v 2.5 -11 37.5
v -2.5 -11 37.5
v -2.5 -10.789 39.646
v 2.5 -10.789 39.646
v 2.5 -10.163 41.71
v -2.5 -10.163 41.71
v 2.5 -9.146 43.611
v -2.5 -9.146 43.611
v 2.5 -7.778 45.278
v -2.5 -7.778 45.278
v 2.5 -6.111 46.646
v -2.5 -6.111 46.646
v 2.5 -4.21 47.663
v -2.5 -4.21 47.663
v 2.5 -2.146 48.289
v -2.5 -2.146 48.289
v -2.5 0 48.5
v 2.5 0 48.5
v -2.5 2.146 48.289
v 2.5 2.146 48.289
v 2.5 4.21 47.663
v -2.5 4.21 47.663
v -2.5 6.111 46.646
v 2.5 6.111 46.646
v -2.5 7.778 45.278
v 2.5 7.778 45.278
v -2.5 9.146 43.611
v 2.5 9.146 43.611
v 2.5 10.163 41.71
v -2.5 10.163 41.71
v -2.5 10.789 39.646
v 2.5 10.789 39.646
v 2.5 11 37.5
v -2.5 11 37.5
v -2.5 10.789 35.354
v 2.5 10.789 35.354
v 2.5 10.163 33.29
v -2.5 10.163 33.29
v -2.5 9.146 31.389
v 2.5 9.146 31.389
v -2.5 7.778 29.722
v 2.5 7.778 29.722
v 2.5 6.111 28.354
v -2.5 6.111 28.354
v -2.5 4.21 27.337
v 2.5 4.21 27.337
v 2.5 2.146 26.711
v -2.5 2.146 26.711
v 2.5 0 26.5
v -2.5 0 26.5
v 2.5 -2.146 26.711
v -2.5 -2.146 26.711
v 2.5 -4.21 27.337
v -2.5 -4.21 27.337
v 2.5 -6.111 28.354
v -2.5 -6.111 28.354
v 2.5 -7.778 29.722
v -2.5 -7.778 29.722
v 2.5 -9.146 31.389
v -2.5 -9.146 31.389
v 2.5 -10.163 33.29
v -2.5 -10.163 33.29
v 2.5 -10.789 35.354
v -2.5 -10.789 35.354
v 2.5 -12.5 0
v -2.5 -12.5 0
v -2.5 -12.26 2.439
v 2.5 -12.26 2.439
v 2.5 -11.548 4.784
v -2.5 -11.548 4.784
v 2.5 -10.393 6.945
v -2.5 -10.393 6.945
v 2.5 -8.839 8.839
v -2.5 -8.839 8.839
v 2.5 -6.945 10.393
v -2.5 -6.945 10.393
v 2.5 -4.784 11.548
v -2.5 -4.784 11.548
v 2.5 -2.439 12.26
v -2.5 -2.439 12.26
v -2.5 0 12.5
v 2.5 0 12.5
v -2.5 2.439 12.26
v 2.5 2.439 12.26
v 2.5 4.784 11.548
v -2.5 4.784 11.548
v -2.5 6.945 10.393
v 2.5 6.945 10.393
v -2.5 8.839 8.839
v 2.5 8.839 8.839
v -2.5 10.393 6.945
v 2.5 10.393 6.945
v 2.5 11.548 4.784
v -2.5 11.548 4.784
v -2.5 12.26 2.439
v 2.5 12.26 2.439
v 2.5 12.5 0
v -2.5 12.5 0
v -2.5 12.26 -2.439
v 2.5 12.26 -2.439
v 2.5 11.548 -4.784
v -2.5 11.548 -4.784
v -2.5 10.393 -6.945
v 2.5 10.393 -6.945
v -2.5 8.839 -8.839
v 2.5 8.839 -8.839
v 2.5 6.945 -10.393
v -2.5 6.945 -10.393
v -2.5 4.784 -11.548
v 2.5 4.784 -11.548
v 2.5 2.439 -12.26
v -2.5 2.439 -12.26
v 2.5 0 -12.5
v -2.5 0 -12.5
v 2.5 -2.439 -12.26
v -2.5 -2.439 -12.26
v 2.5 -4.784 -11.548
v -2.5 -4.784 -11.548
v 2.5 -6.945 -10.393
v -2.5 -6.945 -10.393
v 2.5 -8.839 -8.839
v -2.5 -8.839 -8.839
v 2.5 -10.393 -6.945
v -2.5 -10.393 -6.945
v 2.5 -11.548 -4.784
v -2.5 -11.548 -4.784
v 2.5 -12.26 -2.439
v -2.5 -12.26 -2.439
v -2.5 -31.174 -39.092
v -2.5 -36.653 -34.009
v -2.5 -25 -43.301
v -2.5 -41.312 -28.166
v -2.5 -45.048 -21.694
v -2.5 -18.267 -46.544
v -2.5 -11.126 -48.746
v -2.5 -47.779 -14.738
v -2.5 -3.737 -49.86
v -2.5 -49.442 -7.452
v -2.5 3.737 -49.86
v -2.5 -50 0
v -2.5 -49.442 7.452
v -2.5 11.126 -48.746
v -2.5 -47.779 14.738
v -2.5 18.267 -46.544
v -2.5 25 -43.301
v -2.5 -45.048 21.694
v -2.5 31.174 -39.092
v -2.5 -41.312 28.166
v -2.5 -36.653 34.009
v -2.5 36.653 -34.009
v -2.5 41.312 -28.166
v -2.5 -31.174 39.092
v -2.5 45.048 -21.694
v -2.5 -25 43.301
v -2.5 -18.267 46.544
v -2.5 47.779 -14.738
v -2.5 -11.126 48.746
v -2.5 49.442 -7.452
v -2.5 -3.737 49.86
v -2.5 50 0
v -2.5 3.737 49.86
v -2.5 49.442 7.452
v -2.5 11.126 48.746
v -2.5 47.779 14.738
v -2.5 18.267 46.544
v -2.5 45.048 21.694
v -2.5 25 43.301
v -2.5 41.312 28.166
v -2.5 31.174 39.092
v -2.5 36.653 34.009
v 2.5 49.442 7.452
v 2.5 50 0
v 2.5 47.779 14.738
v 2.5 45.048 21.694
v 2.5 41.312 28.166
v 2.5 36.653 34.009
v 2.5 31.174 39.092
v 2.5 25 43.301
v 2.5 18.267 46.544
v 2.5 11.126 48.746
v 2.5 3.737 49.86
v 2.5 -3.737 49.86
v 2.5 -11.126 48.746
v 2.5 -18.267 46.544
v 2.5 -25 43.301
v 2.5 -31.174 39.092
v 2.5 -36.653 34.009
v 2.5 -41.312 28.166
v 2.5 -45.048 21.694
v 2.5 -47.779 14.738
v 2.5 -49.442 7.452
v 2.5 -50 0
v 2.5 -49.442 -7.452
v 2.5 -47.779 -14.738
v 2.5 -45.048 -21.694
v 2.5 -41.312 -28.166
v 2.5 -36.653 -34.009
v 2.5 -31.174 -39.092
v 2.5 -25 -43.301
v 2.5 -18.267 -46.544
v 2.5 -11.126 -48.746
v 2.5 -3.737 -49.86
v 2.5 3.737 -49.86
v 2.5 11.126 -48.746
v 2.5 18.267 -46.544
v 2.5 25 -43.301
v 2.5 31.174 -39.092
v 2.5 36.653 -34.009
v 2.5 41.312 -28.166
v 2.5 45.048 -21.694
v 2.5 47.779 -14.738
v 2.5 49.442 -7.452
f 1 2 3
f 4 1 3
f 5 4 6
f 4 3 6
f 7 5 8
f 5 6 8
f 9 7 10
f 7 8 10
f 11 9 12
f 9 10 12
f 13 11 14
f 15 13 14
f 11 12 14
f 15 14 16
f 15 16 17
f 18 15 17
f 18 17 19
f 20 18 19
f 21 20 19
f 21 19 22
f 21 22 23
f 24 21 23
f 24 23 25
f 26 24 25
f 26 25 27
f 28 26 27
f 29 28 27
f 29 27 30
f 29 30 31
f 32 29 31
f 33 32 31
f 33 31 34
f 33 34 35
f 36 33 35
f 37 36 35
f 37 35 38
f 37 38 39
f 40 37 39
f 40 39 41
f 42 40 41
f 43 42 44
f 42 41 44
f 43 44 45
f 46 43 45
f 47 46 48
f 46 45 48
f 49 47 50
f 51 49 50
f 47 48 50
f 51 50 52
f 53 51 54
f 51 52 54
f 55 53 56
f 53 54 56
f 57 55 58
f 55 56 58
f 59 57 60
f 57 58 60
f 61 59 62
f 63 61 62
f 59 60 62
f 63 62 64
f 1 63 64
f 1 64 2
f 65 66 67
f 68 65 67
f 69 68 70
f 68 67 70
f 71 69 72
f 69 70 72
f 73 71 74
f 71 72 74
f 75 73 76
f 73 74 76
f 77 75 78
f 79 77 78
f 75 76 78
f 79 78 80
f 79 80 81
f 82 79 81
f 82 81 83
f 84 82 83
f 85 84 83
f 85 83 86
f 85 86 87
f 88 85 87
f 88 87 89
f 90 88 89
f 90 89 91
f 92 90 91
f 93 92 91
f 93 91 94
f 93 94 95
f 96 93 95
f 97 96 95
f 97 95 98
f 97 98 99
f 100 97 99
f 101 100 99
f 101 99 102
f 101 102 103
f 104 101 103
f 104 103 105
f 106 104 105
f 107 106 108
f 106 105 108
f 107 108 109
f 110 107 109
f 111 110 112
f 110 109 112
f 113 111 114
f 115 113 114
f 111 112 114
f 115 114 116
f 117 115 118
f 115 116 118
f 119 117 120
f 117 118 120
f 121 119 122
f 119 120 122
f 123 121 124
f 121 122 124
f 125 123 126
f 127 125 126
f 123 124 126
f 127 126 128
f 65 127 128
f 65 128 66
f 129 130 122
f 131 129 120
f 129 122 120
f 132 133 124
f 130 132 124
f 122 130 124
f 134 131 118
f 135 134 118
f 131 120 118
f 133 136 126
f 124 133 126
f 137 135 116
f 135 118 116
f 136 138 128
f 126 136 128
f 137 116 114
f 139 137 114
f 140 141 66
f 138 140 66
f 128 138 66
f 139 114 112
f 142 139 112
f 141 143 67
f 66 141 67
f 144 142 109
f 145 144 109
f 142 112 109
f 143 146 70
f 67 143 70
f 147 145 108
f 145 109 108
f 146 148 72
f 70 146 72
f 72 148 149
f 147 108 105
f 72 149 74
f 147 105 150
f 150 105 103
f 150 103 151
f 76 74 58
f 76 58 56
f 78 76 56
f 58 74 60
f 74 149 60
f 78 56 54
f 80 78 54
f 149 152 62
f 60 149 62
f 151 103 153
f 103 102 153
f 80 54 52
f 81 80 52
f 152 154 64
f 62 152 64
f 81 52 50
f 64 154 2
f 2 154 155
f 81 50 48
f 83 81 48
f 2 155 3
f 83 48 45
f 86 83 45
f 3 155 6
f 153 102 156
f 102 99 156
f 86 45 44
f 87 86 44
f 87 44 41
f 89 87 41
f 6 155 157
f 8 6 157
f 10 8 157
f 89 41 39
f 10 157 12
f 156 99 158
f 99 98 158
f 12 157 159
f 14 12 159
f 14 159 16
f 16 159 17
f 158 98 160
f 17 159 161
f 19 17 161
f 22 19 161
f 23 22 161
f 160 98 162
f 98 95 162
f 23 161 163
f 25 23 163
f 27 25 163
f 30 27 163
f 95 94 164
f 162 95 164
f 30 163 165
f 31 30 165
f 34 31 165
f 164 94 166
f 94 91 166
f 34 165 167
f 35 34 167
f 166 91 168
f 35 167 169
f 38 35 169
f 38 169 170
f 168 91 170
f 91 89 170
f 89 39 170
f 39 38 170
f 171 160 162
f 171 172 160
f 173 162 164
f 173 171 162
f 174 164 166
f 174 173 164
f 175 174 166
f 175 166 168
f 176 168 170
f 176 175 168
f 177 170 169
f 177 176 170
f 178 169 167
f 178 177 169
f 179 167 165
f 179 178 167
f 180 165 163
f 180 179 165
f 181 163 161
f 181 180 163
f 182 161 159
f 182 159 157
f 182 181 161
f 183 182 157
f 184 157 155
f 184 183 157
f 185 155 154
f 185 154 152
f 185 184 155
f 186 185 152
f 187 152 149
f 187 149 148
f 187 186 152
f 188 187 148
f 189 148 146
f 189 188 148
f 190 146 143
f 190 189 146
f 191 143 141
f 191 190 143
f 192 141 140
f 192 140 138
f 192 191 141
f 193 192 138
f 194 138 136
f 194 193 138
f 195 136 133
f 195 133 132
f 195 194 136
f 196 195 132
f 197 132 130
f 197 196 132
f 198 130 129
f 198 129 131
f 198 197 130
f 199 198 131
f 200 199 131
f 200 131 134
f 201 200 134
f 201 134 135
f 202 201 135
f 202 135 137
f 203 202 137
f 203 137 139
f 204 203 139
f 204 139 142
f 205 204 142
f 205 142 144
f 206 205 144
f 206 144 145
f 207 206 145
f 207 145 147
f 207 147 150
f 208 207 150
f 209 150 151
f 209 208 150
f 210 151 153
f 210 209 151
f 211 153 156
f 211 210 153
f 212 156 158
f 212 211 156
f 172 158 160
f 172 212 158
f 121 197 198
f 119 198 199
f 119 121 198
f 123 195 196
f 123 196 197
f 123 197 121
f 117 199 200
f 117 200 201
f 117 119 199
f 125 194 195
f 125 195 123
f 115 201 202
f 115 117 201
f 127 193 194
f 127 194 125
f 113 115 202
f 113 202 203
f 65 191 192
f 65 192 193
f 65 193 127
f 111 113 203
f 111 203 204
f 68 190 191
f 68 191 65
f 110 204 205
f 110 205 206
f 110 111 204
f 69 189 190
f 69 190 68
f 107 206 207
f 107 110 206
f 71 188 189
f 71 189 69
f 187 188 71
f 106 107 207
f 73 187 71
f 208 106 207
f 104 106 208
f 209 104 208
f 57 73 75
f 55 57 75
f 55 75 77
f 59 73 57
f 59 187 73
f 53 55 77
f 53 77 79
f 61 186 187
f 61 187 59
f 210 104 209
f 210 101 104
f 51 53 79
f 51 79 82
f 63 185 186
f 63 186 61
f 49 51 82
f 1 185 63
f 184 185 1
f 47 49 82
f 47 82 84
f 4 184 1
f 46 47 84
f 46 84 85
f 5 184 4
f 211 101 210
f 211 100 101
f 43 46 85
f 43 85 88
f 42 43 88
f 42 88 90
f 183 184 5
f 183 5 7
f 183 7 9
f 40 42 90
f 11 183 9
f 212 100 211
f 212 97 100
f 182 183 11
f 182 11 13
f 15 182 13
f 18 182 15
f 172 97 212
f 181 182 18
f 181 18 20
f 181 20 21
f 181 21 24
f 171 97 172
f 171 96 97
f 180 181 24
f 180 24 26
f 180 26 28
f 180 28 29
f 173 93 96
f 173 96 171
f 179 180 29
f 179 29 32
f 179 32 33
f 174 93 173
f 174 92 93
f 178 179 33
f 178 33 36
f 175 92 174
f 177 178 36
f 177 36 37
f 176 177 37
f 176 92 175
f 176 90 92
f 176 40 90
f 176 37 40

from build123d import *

# Parameters (mm, degrees)
F0_R     = 50
F1_DEPTH = 2.5
F3_D     = 25
F5_D     = 22


with BuildPart() as f1:
    # F0 (on Right) → F1 (new body, symmetric)
    with BuildSketch(Plane.YZ):
        Circle(F0_R)
    extrude(amount=F1_DEPTH, both=True)

    # F3 (through all)
    with Locations(Plane.YZ.offset(2.5)):
        with Locations((0, 0)):
            Hole(F3_D / 2)

    # F5 (through all)
    with Locations(Plane.YZ.offset(2.5)):
        with Locations((0, 37.5)):
            Hole(F5_D / 2)


solid = f1.part
